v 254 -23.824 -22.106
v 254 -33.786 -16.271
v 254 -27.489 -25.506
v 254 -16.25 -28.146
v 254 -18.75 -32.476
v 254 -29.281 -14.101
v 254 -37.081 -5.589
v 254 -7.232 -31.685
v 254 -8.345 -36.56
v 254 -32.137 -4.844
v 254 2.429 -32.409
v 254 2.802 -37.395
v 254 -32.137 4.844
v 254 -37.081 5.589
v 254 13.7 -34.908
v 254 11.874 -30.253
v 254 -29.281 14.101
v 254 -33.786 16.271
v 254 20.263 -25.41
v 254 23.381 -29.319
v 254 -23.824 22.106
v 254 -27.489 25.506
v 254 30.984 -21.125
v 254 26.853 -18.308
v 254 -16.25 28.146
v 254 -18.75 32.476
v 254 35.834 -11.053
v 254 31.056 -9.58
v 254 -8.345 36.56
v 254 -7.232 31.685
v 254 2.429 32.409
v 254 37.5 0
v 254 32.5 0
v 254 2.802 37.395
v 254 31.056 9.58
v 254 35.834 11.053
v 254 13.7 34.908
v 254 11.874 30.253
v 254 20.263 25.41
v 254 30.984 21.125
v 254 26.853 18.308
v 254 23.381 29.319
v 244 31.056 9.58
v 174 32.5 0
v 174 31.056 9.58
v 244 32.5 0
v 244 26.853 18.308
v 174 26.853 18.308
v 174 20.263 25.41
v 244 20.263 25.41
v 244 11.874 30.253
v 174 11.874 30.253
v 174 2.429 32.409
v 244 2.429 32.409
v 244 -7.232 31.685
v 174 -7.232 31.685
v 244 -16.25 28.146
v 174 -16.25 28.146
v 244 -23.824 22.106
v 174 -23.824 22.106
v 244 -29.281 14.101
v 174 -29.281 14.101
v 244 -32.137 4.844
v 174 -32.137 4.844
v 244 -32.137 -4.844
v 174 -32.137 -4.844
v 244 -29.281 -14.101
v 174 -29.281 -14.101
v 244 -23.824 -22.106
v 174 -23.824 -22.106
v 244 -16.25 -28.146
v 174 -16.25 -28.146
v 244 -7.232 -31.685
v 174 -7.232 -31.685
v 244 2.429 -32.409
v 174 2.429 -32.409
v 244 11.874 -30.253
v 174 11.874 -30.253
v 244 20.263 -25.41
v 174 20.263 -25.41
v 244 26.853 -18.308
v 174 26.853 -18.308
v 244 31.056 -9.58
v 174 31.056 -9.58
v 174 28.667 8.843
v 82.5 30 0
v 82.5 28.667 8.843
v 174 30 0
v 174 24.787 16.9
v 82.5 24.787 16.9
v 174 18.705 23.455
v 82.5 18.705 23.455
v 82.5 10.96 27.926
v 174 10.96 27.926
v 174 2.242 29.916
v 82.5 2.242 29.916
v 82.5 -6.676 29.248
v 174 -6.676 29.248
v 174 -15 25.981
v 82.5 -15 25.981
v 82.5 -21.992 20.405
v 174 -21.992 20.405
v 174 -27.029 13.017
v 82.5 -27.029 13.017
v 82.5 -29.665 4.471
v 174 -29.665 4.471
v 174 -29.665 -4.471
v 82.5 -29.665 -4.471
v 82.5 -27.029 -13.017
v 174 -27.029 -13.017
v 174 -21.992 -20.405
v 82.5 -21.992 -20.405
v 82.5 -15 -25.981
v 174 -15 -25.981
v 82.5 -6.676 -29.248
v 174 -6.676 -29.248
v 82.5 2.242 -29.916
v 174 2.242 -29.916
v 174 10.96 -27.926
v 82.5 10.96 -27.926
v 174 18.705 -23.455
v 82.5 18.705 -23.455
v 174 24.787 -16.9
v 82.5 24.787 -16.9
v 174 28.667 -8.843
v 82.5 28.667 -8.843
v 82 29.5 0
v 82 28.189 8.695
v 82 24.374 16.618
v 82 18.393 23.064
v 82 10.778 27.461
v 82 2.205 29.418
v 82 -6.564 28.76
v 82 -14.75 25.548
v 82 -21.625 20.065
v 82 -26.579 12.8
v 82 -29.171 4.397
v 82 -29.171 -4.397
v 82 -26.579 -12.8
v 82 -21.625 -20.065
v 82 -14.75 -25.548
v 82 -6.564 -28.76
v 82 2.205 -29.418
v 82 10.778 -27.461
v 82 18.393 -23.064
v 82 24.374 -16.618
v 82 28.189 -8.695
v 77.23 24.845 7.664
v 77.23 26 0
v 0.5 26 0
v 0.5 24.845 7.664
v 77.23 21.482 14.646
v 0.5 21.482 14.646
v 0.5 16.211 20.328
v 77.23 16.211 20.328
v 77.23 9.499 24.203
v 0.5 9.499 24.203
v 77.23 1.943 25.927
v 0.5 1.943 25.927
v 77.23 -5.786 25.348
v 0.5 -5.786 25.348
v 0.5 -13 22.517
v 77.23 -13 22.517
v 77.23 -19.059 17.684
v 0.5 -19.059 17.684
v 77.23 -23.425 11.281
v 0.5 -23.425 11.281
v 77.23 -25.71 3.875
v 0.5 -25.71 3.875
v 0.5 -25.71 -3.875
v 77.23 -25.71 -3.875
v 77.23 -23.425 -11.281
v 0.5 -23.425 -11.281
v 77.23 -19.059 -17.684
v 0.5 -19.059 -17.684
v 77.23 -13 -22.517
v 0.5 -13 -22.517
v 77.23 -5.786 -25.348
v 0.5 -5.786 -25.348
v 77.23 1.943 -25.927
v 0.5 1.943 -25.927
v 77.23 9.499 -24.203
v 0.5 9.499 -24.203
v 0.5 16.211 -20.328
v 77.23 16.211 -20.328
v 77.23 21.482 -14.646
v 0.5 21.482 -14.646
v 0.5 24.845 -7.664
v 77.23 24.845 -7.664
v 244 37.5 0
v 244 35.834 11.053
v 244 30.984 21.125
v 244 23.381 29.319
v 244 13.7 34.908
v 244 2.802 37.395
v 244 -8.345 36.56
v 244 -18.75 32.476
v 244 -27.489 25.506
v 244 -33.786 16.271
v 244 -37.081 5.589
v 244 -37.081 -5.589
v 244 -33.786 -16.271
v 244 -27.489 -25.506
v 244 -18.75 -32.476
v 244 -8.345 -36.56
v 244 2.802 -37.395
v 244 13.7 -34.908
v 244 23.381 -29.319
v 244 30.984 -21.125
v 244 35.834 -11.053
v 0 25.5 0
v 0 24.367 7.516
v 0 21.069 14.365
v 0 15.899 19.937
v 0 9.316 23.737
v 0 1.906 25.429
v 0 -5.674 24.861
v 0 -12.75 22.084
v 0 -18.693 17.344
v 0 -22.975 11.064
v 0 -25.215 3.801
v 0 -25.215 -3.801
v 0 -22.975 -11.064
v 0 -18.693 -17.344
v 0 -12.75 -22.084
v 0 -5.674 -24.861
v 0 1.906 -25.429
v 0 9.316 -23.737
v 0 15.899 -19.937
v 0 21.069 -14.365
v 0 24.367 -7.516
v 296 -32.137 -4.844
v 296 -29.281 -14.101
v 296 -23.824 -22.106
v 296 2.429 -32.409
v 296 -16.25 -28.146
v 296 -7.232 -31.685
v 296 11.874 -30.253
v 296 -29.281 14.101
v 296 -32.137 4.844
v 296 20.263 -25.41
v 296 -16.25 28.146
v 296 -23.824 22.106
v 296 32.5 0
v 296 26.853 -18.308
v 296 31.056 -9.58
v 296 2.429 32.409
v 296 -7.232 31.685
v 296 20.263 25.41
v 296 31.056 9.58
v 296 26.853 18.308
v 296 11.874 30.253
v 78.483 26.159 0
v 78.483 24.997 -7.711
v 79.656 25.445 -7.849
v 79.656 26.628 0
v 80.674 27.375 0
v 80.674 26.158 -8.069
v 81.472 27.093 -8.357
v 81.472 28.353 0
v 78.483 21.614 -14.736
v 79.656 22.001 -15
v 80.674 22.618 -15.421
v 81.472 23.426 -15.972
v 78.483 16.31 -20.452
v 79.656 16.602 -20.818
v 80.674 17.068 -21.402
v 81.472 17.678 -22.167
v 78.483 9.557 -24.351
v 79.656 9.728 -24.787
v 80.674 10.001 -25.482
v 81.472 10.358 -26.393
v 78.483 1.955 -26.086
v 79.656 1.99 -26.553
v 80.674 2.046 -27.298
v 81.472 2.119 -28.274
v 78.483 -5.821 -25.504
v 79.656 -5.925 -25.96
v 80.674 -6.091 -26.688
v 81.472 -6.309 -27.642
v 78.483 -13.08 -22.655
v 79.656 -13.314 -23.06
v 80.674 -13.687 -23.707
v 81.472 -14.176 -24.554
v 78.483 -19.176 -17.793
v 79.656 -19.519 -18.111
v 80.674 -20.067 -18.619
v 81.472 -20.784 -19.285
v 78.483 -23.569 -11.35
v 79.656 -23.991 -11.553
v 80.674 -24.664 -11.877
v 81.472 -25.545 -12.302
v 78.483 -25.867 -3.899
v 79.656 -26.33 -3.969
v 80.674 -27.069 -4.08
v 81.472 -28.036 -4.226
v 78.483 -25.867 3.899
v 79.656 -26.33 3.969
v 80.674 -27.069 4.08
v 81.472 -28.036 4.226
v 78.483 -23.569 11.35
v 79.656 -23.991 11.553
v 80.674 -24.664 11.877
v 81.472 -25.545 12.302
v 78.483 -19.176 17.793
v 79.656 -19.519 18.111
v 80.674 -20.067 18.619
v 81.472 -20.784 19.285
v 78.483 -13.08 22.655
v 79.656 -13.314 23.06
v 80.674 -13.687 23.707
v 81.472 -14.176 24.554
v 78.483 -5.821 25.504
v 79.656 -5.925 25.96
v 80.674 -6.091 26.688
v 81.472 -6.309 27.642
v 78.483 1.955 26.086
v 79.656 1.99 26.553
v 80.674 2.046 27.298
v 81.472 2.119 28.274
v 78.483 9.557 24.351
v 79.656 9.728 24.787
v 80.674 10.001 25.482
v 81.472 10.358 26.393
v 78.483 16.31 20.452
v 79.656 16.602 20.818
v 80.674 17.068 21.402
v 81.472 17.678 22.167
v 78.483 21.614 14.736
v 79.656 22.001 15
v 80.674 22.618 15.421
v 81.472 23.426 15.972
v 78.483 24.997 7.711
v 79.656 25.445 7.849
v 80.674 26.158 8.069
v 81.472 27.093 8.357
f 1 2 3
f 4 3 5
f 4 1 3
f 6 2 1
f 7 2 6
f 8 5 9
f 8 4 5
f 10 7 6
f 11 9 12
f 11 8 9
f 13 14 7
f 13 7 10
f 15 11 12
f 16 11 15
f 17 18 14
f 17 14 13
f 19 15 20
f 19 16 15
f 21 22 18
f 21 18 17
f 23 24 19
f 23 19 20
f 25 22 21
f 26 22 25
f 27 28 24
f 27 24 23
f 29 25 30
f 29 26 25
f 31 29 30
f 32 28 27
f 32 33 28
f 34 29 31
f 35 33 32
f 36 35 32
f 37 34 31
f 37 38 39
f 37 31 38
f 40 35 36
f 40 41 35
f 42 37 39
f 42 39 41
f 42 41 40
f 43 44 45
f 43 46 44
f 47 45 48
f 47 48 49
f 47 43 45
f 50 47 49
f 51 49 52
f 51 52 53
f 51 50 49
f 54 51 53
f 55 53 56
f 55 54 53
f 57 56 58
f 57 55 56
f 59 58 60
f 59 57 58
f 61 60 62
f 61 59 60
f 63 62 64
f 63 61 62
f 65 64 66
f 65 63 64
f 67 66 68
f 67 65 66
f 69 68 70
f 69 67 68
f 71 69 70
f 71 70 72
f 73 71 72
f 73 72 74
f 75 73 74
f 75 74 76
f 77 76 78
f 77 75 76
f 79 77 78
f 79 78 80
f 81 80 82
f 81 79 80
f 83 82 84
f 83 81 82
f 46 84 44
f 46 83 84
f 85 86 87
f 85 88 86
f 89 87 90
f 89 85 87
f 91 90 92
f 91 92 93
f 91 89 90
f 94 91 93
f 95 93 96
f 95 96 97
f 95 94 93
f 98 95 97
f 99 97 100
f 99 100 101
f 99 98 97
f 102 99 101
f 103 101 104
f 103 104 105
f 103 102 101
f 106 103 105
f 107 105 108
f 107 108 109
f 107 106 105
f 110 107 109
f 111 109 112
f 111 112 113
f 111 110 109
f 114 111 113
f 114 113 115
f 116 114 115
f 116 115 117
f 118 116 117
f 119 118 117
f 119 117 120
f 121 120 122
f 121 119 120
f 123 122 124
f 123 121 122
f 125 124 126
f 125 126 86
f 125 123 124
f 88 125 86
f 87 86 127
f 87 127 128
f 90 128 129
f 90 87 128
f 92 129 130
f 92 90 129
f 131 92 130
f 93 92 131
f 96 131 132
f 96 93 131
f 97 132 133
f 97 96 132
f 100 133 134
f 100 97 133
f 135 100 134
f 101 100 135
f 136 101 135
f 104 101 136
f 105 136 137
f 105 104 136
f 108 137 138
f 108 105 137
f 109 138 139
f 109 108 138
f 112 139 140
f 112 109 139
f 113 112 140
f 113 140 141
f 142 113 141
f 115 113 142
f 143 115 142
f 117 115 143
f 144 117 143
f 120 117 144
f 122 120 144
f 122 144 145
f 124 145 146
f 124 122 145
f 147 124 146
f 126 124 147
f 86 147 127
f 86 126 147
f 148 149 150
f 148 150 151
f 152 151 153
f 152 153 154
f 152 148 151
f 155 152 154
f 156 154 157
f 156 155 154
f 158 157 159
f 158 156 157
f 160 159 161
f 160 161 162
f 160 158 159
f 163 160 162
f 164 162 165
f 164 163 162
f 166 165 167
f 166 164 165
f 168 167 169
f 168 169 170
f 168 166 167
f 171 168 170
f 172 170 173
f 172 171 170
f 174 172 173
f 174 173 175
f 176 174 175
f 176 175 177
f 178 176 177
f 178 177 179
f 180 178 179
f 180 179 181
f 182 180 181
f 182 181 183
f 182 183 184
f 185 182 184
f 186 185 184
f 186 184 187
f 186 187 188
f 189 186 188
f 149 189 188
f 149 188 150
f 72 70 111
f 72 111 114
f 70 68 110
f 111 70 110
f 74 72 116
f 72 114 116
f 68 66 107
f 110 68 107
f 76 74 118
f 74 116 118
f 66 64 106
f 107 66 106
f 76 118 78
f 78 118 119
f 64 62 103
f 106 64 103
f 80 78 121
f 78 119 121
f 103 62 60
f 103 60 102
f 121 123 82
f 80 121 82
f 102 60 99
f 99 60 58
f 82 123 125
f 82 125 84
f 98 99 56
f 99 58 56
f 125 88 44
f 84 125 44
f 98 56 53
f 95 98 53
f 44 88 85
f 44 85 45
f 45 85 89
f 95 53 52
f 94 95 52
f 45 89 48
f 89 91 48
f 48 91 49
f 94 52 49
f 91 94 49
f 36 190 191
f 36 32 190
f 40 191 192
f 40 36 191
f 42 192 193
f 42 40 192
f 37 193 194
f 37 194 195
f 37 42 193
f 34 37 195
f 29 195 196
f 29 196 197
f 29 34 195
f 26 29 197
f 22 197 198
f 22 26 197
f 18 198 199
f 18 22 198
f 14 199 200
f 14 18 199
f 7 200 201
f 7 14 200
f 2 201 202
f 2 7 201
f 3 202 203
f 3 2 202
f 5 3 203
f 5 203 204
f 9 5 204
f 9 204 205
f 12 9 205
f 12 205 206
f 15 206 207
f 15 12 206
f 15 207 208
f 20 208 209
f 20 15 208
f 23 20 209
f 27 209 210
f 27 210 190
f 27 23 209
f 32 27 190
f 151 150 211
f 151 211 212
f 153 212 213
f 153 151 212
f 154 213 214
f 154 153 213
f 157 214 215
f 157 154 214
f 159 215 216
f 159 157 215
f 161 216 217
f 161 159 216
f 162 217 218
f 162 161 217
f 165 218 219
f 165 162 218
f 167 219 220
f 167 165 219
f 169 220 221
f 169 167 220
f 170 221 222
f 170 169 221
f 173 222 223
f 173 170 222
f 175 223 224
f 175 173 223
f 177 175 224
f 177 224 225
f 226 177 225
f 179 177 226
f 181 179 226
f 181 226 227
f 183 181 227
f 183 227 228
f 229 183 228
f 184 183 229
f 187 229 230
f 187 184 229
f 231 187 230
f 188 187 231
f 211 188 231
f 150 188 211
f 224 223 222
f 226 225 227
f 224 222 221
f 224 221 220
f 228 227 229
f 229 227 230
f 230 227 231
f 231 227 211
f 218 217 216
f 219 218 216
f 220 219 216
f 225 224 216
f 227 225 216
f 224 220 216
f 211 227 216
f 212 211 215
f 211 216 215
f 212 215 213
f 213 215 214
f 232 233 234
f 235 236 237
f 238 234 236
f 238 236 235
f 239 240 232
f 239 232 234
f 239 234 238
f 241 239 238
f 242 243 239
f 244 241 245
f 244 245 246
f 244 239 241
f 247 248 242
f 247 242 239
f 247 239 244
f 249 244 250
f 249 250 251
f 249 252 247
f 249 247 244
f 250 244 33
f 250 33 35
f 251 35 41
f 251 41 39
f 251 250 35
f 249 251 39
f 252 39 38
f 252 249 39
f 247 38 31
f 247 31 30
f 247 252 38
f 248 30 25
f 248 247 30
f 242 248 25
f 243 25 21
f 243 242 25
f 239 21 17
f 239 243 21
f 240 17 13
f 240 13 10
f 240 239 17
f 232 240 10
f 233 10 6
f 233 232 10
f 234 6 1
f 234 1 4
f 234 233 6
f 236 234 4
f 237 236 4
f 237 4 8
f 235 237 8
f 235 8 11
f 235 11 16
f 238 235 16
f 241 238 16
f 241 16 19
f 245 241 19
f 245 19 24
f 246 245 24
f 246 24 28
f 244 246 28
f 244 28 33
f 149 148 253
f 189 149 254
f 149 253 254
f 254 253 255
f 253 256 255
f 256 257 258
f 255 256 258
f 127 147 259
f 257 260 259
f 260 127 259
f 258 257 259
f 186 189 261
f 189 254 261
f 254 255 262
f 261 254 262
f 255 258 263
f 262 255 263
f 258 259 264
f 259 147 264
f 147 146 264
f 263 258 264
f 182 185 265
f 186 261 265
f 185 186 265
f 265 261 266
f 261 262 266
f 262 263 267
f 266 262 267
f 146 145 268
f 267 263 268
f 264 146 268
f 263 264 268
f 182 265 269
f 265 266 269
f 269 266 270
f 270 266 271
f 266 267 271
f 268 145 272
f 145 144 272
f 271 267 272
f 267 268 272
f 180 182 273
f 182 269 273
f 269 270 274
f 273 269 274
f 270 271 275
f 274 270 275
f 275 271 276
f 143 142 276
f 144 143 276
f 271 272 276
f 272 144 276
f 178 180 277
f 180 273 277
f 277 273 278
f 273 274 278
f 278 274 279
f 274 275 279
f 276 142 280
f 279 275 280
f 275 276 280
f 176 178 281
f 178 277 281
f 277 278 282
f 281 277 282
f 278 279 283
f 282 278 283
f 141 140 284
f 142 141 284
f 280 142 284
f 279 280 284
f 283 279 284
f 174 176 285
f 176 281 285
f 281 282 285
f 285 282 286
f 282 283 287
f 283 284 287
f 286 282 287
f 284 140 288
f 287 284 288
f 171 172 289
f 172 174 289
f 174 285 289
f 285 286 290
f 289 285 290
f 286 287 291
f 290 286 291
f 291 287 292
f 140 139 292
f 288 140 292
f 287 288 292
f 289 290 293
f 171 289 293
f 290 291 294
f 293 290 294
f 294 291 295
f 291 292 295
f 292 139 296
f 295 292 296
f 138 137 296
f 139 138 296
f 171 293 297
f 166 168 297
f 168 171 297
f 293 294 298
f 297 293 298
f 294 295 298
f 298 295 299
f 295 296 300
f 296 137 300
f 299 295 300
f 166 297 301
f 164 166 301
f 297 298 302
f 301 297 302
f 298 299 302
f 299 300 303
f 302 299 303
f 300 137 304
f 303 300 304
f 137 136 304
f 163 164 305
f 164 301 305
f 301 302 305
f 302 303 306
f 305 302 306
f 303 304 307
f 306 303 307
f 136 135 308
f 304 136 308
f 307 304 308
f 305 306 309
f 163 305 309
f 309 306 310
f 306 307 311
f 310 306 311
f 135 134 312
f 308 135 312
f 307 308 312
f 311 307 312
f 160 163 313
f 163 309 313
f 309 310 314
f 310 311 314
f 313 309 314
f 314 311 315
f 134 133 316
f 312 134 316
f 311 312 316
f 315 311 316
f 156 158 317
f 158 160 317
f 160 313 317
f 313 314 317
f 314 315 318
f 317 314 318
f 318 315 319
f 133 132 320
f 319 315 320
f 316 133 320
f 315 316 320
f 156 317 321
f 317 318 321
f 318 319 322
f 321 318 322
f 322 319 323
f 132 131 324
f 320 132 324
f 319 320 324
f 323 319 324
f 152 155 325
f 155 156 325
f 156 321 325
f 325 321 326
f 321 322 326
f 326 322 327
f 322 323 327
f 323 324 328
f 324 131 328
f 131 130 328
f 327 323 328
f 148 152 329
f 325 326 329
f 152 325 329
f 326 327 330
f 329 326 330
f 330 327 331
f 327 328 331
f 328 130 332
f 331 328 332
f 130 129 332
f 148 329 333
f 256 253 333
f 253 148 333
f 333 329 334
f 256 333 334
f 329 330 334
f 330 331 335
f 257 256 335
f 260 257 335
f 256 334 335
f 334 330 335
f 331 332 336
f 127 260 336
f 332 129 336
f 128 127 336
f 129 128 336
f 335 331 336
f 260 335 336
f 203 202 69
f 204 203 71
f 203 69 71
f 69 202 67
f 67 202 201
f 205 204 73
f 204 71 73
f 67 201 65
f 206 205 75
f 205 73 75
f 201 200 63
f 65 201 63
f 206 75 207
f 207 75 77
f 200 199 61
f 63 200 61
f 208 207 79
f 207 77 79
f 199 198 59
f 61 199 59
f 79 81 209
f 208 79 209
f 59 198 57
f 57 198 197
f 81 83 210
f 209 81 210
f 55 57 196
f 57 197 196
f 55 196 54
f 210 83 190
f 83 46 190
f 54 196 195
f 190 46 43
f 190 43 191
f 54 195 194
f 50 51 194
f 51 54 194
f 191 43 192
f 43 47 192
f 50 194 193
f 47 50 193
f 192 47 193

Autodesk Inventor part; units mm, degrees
ref_plane "Начальная плоскость" through (0, 0, 0) normal (1, 0, 0) x (0, 1, 0)
ref_plane "XZ Plane" through (0, 0, 0) normal (0, 1, 0) x (-1, 0, 0)
ref_plane "XY Plane" through (0, 0, 0) normal (0, 0, 1) x (1, 0, 0)
sketch "Основной эскиз" plane through (0, 0, 0) normal (0, 0, 1) x (1, 0, 0)
  line L0 (0, 0) -> (296, 0)
  line L1 (0, 0) -> (0, 26)
  line L2 (0, 26) -> (82, 26)
  line L3 (82, 26) -> (82, 30)
  line L4 (82, 30) -> (174, 30)
  line L5 (174, 30) -> (174, 32.5)
  line L6 (174, 32.5) -> (244, 32.5)
  line L7 (244, 32.5) -> (244, 37.5)
  line L8 (254, 37.5) -> (254, 32.5)
  line L9 (244, 37.5) -> (254, 37.5)
  line L10 (296, 32.5) -> (296, 0)
  line L11 (254, 32.5) -> (296, 32.5)
  dimension "d3" = 52
  dimension "d4" = 60
  dimension "d5" = 65
  dimension "d6" = 75
  dimension "d7" = 65
revolve "Вращение1" add sketch "Основной эскиз" angle 360 about axis through (0, 0, 0) along (1, 0, 0)
chamfer "Фаска3" distance 0.5 angle 45 1 edges at (82, -30, 0) measured on face at (143.3333, 29.9027, -2.414)
chamfer "Фаска1" distance 0.5 angle 45 1 edges at (0, -26, 0) measured on face at (54.6667, 25.9157, -2.0921)
fillet "Сопряжение1" radius 5 1 edges at (82, -26, 0)
equation "\"Length\" = 296"
properties part number "ТихВал" material "Steel"
